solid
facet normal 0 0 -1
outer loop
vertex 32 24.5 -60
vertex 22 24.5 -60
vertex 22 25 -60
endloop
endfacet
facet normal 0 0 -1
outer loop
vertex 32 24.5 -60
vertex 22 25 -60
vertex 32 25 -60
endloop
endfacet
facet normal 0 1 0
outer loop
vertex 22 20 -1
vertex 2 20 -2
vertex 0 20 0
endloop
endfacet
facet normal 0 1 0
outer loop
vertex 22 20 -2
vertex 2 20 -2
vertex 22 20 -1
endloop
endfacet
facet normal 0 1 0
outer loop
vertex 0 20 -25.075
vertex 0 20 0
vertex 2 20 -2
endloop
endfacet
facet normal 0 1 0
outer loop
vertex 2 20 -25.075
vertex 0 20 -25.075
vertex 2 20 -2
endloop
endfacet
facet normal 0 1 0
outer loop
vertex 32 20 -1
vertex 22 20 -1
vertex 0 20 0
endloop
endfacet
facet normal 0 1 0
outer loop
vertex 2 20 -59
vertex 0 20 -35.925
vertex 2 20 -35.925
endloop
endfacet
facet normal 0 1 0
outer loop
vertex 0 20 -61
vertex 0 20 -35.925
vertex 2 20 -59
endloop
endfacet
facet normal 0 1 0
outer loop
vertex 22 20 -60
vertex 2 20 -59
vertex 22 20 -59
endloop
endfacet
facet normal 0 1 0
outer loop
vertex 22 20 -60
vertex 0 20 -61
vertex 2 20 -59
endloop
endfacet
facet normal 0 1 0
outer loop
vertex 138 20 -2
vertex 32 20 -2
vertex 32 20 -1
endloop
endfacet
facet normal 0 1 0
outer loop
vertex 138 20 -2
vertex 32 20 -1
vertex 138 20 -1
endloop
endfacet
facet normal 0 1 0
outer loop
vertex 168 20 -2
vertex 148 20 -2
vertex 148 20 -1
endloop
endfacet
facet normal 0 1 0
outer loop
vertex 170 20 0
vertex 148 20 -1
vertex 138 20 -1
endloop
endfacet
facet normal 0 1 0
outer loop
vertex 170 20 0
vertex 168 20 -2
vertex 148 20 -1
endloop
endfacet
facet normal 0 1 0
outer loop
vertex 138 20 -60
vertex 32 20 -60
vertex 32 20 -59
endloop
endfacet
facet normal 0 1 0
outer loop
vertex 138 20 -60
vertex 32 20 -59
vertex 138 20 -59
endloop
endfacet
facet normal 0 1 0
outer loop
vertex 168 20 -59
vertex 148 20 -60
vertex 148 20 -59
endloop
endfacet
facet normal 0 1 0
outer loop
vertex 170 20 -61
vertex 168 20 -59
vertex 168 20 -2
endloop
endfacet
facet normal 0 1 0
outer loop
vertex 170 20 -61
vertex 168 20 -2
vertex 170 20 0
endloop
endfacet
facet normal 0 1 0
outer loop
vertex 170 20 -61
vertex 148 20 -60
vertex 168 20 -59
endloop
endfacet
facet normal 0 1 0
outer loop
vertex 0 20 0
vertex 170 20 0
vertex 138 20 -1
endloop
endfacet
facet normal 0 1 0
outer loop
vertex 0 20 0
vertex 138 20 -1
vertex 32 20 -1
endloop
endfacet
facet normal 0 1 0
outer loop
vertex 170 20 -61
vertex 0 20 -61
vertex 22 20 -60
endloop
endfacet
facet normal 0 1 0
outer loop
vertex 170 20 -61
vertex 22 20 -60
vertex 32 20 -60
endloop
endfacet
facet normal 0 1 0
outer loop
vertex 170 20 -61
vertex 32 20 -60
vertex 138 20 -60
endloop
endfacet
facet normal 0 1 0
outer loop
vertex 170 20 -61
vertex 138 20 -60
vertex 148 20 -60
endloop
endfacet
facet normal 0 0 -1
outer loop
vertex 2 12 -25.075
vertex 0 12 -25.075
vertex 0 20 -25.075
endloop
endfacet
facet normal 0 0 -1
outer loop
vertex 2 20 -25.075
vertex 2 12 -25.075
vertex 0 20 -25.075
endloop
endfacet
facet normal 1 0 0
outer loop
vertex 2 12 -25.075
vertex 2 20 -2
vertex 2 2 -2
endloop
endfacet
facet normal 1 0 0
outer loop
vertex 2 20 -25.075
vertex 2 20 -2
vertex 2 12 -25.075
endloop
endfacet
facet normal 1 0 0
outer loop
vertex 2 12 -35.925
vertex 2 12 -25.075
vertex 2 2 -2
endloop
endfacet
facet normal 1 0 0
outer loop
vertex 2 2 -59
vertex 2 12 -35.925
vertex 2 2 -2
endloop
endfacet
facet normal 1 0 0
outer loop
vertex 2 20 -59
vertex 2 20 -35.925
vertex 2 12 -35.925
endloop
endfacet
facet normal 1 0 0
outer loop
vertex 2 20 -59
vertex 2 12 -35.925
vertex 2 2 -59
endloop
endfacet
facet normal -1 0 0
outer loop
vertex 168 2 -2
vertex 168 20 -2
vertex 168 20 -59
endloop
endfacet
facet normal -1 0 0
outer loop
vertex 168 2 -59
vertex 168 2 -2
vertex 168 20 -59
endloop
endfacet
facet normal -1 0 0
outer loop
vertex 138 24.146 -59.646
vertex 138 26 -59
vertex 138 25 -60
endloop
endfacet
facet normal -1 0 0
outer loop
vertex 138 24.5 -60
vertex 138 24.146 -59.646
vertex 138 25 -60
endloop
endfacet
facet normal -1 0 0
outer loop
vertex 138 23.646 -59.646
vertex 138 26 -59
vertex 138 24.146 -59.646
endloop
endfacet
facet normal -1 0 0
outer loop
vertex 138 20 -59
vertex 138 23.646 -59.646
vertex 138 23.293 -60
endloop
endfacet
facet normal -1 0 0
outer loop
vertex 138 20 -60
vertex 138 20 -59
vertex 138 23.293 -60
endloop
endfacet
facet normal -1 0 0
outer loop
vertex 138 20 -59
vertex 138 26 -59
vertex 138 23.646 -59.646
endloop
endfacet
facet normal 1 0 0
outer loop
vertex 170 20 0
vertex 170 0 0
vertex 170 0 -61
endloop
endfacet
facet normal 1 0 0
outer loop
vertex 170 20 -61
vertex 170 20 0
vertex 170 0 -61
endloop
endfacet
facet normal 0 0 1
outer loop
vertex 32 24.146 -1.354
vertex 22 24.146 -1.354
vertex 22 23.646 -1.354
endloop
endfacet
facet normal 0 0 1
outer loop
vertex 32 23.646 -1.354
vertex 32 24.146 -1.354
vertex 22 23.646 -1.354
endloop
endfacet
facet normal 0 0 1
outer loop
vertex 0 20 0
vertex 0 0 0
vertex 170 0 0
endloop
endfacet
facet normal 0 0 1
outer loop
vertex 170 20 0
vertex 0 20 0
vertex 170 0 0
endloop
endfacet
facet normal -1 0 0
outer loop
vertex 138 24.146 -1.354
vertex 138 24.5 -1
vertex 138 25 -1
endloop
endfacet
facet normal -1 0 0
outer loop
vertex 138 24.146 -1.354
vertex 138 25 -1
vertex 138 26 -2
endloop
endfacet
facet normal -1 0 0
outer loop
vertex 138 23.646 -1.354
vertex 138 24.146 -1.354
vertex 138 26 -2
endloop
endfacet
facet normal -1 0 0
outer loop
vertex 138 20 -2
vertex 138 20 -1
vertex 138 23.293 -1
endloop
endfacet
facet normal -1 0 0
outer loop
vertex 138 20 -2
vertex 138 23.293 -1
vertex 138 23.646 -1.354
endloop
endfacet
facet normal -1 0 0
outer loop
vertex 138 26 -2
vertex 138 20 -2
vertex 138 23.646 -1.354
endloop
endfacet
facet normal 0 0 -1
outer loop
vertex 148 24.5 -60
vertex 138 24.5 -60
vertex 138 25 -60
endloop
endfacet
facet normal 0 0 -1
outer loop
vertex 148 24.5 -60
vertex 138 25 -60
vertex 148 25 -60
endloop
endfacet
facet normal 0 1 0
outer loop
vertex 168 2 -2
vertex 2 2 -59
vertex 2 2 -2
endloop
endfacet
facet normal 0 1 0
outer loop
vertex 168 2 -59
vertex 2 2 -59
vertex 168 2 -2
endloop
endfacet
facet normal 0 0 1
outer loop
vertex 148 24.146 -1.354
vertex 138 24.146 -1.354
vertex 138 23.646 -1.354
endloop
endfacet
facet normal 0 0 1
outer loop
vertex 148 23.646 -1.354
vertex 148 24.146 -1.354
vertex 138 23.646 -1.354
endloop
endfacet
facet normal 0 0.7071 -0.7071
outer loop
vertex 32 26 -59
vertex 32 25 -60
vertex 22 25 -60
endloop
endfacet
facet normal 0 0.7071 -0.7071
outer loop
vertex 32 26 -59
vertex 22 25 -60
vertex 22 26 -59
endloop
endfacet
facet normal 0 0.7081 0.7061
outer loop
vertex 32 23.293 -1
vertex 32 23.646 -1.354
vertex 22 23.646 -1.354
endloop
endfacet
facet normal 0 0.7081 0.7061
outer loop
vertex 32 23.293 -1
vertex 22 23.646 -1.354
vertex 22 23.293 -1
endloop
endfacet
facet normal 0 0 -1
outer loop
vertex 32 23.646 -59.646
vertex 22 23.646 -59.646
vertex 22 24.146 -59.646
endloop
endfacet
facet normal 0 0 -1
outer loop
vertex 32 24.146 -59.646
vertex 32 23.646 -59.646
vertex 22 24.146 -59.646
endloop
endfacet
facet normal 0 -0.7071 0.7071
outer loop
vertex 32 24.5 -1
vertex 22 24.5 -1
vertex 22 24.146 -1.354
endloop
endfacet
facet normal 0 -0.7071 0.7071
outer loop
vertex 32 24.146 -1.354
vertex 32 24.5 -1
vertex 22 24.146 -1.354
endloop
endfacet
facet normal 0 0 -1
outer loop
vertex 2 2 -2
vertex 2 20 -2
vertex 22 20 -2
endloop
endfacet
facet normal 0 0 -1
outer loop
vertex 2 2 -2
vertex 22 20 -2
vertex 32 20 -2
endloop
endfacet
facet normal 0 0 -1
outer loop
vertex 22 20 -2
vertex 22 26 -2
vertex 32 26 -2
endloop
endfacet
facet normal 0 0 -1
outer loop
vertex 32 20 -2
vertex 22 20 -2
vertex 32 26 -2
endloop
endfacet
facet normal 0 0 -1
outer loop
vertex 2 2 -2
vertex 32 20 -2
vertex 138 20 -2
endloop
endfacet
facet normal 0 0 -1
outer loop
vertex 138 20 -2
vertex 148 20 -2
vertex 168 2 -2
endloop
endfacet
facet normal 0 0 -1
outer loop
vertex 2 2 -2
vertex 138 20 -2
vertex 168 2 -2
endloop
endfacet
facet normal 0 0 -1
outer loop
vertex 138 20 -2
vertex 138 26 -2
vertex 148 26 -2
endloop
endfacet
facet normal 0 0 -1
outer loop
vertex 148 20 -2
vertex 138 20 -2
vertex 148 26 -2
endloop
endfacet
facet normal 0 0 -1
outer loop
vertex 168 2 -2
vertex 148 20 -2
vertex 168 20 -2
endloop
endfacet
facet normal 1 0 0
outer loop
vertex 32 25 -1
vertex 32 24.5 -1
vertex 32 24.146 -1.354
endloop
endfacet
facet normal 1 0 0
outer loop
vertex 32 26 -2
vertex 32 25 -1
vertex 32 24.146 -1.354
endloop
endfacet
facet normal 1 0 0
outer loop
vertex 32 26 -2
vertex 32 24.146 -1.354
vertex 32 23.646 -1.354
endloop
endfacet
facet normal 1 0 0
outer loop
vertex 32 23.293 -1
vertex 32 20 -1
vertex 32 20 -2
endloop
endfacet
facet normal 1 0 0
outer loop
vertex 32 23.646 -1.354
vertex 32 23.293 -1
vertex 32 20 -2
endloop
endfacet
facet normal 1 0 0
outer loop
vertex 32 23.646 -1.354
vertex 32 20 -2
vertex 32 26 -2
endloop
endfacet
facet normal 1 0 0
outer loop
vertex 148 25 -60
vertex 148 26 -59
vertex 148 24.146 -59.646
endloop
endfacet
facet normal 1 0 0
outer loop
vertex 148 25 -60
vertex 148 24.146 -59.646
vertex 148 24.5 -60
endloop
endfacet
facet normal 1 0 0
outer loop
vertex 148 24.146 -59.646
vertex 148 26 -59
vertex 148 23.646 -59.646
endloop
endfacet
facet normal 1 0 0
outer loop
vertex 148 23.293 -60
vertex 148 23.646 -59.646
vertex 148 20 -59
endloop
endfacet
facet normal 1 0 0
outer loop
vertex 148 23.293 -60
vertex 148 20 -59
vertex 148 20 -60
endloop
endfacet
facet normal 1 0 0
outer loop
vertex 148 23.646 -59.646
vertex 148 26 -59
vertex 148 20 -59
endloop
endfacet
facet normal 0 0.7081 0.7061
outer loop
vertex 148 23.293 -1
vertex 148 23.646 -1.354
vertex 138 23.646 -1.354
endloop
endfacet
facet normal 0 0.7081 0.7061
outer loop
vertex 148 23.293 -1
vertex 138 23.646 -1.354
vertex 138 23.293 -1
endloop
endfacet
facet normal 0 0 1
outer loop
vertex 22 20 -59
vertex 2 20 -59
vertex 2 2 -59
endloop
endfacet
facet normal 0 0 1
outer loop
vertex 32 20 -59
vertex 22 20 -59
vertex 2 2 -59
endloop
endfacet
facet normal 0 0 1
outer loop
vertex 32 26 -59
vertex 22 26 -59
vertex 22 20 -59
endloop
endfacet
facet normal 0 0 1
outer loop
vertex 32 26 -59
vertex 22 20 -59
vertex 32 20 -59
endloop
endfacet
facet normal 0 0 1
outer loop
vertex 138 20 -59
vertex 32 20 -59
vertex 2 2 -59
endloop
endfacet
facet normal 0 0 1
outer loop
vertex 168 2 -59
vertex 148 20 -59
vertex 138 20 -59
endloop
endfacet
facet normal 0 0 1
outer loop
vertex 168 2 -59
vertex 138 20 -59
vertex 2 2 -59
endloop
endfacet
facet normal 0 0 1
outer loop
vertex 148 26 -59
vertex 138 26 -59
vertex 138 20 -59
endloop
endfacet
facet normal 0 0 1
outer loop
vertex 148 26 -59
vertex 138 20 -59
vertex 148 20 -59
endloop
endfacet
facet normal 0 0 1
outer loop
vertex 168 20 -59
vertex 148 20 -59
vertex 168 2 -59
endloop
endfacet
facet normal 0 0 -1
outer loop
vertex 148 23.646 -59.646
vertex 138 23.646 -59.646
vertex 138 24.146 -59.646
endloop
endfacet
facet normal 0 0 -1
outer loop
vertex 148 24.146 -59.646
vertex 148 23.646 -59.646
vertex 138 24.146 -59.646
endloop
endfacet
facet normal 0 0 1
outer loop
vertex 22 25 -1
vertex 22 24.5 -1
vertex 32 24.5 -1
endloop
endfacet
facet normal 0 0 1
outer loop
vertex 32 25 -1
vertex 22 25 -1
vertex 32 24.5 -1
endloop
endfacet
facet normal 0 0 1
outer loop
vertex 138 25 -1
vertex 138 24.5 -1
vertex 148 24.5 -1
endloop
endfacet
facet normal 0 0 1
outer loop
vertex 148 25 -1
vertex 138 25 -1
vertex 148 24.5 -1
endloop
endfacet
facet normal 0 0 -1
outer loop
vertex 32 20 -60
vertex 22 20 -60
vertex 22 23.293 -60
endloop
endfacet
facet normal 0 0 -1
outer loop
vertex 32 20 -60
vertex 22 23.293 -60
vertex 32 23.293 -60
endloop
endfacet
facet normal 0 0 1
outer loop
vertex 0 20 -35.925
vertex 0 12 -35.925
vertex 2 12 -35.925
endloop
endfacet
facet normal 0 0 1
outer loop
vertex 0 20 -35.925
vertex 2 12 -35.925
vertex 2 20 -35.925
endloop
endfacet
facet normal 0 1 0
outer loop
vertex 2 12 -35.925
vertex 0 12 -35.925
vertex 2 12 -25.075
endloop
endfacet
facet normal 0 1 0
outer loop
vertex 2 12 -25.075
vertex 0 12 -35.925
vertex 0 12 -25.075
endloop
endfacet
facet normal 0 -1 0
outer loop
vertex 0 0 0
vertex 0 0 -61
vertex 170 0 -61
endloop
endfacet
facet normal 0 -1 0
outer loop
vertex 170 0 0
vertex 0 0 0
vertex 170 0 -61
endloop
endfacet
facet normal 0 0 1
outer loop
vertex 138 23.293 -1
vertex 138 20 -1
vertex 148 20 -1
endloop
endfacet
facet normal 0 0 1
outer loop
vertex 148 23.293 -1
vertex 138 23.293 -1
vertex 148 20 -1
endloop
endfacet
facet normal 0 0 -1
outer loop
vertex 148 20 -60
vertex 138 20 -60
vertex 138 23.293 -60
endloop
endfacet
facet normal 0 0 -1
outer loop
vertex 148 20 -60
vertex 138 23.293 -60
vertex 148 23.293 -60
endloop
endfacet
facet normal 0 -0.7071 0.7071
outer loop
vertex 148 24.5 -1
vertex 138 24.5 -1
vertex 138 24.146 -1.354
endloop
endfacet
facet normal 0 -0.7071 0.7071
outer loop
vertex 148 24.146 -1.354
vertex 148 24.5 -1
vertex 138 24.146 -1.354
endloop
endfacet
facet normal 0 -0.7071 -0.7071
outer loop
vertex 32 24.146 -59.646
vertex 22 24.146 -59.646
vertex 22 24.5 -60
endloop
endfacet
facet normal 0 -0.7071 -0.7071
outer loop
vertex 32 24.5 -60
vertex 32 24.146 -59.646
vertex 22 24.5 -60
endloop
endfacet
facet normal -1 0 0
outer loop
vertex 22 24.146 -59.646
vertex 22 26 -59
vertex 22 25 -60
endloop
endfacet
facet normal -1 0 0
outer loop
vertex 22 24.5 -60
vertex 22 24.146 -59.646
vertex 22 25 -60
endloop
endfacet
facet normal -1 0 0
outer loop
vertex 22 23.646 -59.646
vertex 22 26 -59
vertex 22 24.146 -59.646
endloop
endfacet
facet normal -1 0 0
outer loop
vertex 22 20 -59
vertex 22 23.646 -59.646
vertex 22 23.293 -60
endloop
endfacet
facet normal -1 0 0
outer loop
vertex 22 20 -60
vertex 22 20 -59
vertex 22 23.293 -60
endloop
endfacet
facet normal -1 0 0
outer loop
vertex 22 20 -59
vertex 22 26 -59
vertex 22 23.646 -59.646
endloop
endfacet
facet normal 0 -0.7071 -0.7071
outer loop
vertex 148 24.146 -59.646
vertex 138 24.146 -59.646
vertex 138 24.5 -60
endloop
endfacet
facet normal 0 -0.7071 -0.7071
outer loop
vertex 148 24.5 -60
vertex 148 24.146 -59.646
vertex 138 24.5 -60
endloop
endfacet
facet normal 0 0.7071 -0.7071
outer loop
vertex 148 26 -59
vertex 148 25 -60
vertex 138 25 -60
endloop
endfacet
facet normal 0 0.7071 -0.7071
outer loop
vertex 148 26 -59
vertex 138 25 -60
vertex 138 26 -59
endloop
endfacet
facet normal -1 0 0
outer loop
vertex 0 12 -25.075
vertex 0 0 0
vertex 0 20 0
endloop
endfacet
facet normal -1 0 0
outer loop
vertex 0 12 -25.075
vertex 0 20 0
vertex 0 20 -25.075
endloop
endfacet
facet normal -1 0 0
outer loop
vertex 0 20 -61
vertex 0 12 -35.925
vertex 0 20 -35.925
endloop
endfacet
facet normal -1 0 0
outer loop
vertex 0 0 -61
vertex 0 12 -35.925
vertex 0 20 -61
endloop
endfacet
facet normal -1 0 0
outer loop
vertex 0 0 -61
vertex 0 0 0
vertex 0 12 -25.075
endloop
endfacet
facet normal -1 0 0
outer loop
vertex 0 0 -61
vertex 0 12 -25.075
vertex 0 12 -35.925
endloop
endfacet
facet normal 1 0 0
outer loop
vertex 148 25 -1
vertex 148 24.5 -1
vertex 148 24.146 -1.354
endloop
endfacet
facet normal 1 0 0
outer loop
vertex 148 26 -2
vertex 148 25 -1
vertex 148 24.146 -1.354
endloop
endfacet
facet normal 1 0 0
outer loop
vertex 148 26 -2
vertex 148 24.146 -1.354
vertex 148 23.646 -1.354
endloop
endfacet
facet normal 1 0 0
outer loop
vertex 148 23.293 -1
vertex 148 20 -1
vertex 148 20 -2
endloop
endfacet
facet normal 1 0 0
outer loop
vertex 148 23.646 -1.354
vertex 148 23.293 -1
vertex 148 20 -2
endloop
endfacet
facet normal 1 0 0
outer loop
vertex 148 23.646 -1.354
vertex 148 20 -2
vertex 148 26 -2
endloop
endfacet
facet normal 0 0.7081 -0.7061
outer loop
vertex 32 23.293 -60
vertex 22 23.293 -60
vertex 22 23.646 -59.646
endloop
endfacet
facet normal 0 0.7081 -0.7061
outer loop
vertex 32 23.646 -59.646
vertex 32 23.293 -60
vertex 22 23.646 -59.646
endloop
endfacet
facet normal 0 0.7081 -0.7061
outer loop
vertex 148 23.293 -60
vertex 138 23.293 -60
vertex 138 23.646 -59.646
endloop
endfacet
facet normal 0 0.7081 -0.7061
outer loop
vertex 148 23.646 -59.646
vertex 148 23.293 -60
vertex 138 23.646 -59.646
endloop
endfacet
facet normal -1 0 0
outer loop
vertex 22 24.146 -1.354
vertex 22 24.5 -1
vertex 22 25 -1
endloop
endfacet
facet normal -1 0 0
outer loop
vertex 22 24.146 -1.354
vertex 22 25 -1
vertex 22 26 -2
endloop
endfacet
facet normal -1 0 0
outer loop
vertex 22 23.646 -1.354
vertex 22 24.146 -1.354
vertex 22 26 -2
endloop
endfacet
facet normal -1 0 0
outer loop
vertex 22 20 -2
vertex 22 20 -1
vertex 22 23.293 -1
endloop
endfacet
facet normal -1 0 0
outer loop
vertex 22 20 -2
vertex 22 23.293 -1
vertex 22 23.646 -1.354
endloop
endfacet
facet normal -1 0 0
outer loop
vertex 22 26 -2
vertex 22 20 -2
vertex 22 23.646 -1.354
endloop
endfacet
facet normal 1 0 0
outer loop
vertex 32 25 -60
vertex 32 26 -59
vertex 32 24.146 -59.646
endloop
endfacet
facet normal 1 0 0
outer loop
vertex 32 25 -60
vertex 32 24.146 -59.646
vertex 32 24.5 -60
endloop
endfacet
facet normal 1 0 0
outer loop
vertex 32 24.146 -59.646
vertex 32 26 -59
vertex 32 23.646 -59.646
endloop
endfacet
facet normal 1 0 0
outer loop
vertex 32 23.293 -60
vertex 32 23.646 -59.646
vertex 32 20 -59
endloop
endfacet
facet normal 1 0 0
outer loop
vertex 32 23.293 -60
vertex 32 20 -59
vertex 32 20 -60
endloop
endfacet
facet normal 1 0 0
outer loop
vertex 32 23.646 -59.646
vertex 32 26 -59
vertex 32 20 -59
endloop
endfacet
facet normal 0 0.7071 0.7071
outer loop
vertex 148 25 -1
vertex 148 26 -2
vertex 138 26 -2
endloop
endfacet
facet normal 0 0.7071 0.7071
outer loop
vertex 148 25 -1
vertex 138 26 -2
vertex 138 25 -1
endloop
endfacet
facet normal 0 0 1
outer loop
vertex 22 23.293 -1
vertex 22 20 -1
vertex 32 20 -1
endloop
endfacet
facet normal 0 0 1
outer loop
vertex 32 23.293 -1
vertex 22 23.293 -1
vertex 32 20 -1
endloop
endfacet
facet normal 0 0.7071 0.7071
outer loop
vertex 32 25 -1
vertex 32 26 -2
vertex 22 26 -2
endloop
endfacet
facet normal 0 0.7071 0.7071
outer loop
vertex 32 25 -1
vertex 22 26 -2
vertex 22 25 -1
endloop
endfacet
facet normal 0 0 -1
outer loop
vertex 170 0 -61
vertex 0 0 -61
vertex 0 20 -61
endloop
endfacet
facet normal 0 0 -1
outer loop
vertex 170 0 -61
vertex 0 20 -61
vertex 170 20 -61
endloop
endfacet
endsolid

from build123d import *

# Parameters (mm, degrees)
SKETCH1_W           = 170
SKETCH1_H           = 61
BOSS_EXTRUDE1_DEPTH = 20
SKETCH2_W           = 166
SKETCH2_H           = 57
CUT_EXTRUDE1_DEPTH  = 18
SKETCH3_W           = 10
SKETCH3_H           = 1
BOSS_EXTRUDE2_DEPTH = 6
CUT_EXTRUDE2_DEPTH  = 200
SKETCH5_W           = 10.85
SKETCH5_H           = 8
CUT_EXTRUDE3_DEPTH  = 5


with BuildPart() as part:
    # Sketch1 → Boss-Extrude1 (new body)
    with BuildSketch(Plane(origin=(0, 0, 0), x_dir=(1, 0, 0), z_dir=(0, 1, 0))):
        with Locations((85, 30.5)):
            Rectangle(SKETCH1_W, SKETCH1_H)
    extrude(amount=BOSS_EXTRUDE1_DEPTH)

    # Sketch2 → Cut-Extrude1 (cut)
    with BuildSketch(Plane(origin=(0, 20, 0), x_dir=(1, 0, 0), z_dir=(0, 1, 0))):
        with Locations((85, 30.5)):
            Rectangle(SKETCH2_W, SKETCH2_H)
    extrude(amount=-CUT_EXTRUDE1_DEPTH, mode=Mode.SUBTRACT)

    # Sketch3 → Boss-Extrude2 (add)
    with BuildSketch(Plane(origin=(0, 20, 0), x_dir=(1, 0, 0), z_dir=(0, 1, 0))):
        with Locations((27, 1.5)):
            Rectangle(SKETCH3_W, SKETCH3_H)
        with Locations((143, 1.5)):
            Rectangle(SKETCH3_W, SKETCH3_H)
        with Locations((27, 59.5)):
            Rectangle(SKETCH3_W, SKETCH3_H)
        with Locations((143, 59.5)):
            Rectangle(SKETCH3_W, SKETCH3_H)
    extrude(amount=BOSS_EXTRUDE2_DEPTH)

    # Sketch4 → Cut-Extrude2 (cut)
    with BuildSketch(Plane.ZY.offset(-22)):
        Polygon((-60, 25), (-59, 26), (-60, 26), align=None)
        Polygon((-59.646446609, 24.146446609), (-60, 24.5), (-60, 23.292893219), (-59.646446609, 23.646446609), align=None)
        Polygon((-1, 26), (-2, 26), (-1, 25), align=None)
        Polygon((-1, 23.292893219), (-1, 24.5), (-1.353553391, 24.146446609), (-1.353553391, 23.646446609), align=None)
    extrude(amount=-CUT_EXTRUDE2_DEPTH, mode=Mode.SUBTRACT)

    # Sketch5 → Cut-Extrude3 (cut)
    with BuildSketch(Plane.ZY):
        with Locations((-30.5, 16)):
            Rectangle(SKETCH5_W, SKETCH5_H)
    extrude(amount=-CUT_EXTRUDE3_DEPTH, mode=Mode.SUBTRACT)


solid = part.part
